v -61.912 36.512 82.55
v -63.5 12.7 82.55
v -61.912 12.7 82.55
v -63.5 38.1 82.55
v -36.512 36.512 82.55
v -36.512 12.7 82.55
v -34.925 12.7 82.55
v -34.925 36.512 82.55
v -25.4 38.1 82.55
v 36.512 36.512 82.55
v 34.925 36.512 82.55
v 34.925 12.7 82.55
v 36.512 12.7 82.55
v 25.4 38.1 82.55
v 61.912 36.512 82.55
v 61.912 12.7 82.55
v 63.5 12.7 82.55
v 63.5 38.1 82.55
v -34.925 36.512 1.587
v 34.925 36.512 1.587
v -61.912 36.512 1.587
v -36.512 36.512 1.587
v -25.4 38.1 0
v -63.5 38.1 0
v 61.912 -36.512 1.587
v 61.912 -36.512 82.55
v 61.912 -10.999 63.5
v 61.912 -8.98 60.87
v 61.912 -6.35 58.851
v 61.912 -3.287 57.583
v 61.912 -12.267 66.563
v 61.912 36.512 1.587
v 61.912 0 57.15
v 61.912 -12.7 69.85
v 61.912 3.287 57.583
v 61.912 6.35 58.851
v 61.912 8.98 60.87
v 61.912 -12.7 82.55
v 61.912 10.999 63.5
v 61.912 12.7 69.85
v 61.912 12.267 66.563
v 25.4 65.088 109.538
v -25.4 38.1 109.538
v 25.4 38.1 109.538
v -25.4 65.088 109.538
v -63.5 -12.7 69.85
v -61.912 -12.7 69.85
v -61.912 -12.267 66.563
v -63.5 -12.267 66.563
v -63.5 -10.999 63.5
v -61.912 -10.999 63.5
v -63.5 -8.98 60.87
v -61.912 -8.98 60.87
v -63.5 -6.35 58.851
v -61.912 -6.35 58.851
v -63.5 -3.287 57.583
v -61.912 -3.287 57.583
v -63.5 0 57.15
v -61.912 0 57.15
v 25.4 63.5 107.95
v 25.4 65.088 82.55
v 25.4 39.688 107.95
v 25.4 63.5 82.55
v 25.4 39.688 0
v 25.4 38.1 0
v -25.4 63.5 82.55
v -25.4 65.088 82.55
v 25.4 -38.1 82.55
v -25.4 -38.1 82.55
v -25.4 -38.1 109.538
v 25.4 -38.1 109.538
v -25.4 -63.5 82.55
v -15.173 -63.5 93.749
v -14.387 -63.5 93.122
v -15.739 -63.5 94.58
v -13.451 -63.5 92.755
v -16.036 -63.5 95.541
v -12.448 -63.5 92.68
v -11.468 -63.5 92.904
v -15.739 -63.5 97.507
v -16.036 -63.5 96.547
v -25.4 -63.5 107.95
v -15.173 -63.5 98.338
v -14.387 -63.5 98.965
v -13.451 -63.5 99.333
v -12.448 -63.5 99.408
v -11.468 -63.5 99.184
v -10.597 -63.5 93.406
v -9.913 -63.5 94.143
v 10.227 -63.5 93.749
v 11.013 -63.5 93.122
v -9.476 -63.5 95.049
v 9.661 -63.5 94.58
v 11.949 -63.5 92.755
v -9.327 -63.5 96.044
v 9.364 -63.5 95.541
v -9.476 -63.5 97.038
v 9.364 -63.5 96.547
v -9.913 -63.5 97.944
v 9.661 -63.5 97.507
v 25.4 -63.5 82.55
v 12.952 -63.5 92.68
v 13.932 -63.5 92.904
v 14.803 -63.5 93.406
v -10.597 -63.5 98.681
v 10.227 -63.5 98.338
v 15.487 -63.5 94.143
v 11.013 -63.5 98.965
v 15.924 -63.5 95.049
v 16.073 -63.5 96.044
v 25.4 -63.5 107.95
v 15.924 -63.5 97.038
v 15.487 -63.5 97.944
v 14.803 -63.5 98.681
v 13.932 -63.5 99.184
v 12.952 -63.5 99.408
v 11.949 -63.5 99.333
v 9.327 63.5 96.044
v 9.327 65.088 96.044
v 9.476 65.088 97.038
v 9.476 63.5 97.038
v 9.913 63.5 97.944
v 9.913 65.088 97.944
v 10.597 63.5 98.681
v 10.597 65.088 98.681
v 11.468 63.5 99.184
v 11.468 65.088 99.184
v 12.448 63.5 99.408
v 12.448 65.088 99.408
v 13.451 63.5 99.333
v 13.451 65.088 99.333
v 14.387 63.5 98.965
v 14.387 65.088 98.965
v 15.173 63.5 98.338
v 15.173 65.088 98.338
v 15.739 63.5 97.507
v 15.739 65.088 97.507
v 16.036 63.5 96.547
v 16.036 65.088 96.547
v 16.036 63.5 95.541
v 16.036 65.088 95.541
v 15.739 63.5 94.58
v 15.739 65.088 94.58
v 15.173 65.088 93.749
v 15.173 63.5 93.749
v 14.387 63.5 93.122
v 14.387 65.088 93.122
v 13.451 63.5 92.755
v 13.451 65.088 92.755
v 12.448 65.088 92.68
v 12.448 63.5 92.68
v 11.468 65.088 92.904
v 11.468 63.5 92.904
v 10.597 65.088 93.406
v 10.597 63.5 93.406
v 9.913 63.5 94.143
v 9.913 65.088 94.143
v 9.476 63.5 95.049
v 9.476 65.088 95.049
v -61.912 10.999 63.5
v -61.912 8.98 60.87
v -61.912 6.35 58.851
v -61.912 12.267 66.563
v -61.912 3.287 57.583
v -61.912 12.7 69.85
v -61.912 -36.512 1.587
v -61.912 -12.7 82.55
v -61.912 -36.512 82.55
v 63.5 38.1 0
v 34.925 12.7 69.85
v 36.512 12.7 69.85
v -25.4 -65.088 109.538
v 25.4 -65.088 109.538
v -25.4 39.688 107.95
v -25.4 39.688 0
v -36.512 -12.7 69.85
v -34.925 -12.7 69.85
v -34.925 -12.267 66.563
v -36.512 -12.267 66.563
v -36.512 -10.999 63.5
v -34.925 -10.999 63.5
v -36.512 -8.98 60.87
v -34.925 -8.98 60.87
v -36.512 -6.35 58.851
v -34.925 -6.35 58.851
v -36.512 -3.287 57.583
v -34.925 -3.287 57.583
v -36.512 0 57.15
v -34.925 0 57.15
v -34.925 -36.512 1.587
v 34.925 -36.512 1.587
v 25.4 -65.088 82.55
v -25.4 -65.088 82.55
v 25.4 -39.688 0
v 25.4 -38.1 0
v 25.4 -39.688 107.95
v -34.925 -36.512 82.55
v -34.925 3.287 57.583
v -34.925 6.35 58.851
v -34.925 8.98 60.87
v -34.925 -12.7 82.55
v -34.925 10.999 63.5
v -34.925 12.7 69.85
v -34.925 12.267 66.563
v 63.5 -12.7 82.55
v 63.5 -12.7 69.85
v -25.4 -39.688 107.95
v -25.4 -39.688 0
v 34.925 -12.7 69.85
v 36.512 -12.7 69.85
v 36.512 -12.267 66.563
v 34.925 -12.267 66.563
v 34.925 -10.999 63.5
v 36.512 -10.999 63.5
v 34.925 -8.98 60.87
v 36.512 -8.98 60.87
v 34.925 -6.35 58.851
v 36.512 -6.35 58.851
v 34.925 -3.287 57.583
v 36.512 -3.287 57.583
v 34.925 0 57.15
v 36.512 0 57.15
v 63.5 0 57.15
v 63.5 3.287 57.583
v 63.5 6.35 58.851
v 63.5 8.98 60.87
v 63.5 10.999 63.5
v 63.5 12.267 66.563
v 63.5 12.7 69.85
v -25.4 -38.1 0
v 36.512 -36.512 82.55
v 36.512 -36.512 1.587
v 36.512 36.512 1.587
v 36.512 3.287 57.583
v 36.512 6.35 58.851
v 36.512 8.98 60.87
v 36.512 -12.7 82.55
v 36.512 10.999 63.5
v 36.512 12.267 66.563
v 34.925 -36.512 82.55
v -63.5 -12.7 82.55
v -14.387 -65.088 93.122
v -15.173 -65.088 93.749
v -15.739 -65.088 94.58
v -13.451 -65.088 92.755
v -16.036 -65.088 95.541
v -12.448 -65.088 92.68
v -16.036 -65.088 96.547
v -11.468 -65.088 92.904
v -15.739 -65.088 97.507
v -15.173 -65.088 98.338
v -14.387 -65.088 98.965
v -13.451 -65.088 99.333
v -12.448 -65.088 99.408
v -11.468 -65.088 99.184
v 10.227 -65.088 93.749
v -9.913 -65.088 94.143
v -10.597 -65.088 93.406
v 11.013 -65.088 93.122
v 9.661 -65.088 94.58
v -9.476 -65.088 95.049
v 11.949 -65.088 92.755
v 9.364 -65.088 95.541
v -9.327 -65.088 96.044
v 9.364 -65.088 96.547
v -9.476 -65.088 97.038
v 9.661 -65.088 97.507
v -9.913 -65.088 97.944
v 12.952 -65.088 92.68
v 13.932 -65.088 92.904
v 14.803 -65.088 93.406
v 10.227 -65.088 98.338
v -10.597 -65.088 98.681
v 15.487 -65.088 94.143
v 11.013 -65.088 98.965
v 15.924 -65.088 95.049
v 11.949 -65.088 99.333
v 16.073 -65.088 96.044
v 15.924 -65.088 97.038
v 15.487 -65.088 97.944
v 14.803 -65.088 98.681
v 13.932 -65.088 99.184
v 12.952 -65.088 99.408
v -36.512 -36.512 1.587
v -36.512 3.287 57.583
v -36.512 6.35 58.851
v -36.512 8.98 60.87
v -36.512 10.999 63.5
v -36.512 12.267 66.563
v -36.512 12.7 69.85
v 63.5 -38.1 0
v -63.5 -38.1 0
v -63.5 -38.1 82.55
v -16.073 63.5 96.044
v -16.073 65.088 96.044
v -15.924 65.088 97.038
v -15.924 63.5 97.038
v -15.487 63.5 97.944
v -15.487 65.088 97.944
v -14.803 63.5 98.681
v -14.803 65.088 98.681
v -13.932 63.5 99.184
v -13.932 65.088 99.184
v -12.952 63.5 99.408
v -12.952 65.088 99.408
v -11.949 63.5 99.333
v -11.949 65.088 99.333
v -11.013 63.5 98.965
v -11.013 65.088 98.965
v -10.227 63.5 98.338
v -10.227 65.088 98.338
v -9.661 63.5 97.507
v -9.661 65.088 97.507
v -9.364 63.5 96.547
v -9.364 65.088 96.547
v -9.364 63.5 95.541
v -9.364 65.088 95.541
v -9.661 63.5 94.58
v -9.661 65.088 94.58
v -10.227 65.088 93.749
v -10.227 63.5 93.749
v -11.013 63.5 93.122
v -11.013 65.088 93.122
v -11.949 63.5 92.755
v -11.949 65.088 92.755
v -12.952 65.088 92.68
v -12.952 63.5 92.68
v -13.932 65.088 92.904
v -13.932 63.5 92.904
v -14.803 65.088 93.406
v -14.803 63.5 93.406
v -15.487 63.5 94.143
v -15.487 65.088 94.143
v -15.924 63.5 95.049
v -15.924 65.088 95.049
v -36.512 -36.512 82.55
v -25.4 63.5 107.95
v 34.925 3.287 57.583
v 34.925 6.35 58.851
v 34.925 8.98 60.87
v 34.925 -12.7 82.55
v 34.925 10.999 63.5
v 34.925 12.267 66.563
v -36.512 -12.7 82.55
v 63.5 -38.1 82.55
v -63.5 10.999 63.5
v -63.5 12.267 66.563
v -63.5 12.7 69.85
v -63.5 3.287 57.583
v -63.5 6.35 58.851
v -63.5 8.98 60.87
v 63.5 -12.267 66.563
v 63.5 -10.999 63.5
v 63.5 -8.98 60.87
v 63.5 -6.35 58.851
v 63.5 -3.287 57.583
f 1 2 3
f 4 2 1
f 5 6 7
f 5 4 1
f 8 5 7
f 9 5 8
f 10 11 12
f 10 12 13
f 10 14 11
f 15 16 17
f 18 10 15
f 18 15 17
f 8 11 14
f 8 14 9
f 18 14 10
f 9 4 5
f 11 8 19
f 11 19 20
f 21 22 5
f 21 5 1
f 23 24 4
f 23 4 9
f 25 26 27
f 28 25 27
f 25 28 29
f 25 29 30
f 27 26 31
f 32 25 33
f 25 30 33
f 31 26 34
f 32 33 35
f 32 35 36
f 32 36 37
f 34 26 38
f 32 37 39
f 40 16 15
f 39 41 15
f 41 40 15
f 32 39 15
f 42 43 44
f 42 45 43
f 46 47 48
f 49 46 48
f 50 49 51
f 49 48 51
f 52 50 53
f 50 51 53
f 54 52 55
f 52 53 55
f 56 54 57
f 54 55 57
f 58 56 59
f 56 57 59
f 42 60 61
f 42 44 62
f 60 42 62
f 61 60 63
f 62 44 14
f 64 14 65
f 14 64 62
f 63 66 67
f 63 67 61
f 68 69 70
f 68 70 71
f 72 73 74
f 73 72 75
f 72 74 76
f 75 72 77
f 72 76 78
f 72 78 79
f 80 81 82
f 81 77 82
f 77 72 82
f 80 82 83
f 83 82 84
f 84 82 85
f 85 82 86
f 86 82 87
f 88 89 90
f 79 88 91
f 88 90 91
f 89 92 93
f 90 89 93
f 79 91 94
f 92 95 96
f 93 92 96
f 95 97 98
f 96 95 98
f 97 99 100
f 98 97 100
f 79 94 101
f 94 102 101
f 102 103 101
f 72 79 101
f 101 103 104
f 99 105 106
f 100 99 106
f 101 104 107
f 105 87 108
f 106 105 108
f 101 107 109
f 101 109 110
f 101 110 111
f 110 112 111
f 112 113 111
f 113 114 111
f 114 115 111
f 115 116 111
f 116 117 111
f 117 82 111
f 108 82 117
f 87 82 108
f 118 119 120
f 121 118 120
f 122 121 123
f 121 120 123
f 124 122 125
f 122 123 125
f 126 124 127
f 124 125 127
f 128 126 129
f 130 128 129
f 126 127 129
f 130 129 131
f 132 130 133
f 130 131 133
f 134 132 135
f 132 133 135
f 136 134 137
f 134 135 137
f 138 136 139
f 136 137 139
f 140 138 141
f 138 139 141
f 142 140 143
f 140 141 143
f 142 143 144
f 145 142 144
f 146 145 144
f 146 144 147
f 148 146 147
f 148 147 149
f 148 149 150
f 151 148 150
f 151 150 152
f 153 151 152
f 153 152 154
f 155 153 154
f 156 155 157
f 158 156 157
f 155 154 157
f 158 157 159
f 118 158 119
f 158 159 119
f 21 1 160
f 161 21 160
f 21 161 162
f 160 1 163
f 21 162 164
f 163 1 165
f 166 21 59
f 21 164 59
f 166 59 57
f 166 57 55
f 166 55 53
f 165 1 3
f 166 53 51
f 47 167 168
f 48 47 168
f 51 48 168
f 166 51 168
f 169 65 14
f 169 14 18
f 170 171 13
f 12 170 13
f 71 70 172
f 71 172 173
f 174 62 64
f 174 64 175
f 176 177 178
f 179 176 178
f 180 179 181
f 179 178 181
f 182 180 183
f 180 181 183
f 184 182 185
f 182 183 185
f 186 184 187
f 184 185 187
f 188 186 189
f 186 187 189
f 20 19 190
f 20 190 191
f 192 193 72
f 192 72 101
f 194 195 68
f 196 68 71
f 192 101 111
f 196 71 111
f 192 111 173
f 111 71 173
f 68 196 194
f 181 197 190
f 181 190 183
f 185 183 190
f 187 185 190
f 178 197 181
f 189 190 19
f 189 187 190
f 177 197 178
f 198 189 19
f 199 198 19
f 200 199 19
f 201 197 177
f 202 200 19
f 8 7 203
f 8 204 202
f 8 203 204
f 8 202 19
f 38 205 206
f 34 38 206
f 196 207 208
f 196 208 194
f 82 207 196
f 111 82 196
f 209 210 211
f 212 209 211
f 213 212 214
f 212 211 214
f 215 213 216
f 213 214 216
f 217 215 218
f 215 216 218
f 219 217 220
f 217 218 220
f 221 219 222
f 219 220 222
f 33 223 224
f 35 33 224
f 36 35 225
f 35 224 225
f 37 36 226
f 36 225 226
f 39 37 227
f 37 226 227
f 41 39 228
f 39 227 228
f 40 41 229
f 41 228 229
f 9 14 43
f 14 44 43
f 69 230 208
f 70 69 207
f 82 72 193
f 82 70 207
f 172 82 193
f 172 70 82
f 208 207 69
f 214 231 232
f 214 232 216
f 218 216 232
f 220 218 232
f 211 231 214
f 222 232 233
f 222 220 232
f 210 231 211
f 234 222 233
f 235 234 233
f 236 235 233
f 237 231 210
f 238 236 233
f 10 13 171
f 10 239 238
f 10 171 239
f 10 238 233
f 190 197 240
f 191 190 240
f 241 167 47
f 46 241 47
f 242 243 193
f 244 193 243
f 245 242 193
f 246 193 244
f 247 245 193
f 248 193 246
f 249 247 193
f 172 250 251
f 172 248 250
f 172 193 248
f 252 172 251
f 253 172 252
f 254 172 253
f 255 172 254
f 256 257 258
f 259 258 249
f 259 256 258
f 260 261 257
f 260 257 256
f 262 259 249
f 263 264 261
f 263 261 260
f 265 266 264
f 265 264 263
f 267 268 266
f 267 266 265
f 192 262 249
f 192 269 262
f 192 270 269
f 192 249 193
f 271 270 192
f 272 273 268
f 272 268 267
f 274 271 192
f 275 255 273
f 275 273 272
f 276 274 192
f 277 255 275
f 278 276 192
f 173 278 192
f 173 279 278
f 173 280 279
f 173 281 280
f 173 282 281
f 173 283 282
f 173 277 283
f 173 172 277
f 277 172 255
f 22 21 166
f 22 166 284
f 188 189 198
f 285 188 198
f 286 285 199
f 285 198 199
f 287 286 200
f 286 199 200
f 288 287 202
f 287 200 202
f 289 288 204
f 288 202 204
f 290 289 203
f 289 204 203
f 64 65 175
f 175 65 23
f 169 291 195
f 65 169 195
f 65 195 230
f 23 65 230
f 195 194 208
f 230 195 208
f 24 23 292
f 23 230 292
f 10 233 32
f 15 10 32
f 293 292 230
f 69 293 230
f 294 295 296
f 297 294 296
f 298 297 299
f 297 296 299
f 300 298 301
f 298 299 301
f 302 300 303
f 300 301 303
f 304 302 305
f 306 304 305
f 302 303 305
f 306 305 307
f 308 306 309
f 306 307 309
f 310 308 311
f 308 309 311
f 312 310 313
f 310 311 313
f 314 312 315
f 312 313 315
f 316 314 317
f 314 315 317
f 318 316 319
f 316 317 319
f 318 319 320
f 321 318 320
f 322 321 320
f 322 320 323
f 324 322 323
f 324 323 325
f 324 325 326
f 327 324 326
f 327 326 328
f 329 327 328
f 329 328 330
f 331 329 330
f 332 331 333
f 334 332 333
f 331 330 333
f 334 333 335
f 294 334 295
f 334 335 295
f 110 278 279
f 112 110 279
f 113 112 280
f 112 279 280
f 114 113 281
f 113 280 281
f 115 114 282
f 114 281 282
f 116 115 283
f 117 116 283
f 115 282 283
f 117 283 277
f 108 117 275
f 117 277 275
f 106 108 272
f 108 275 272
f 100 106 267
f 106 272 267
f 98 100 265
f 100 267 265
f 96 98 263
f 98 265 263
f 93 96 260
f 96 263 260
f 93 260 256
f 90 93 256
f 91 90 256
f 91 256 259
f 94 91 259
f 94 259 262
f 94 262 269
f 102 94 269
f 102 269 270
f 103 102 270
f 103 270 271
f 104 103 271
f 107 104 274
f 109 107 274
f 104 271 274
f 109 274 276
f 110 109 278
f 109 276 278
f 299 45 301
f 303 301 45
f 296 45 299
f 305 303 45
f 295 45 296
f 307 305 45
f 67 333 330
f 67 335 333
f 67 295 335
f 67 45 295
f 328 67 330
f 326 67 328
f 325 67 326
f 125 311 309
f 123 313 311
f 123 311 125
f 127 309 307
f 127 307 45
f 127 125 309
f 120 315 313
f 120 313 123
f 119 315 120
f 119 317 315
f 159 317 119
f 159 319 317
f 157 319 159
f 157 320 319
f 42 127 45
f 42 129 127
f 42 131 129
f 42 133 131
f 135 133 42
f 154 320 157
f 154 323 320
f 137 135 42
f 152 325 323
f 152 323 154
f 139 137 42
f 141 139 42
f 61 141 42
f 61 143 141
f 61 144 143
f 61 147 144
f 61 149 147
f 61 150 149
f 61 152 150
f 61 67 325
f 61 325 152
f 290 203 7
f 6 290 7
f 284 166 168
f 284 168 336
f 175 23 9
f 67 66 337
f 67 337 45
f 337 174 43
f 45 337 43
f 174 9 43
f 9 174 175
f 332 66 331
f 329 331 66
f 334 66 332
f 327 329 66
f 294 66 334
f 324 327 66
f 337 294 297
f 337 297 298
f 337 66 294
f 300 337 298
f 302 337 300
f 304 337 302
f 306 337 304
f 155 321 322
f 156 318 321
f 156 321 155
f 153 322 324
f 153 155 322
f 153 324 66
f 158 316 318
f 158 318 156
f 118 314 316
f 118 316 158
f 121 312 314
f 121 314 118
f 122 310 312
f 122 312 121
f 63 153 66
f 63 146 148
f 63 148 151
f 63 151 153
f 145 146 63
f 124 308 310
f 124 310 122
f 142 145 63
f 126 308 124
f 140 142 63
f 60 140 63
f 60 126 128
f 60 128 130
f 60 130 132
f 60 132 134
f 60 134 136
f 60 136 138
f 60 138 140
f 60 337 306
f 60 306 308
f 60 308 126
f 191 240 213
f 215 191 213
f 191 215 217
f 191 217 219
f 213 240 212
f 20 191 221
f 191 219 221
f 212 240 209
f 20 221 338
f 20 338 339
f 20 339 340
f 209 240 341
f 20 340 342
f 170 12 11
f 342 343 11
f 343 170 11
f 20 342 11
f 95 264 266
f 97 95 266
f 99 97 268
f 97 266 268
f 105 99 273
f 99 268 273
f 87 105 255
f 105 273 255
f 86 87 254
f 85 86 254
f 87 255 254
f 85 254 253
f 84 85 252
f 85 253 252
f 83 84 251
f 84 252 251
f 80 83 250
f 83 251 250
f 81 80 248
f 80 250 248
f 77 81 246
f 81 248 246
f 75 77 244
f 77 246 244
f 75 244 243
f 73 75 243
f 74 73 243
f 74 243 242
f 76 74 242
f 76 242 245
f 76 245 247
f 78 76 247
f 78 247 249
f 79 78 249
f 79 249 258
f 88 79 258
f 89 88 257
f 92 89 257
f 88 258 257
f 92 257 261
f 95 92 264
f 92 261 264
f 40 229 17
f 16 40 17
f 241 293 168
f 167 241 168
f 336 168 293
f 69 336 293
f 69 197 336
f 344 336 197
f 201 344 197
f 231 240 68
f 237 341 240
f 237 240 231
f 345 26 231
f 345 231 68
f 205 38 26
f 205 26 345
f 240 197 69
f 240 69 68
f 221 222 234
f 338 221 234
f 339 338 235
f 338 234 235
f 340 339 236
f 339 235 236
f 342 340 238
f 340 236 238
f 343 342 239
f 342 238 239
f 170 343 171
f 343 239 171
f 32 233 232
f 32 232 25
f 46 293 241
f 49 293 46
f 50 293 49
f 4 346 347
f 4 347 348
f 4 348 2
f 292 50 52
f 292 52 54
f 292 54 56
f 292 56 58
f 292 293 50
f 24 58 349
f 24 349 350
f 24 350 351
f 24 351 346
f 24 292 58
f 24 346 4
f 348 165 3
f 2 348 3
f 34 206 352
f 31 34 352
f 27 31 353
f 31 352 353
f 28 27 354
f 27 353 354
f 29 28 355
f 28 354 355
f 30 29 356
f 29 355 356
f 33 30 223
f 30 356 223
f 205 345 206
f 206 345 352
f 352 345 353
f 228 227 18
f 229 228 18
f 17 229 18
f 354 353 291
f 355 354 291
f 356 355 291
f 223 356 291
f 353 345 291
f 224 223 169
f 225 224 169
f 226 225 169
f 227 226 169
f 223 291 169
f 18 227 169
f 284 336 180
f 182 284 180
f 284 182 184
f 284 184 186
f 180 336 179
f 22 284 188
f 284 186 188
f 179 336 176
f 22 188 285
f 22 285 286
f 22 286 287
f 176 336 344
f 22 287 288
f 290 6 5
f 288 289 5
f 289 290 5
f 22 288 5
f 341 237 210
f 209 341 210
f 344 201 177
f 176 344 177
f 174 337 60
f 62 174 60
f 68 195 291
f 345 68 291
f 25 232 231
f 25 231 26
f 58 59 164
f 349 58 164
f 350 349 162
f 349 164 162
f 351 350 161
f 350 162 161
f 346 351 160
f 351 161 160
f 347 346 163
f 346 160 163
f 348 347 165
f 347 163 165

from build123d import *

# Parameters (mm, degrees)
F0_W      = 127
F0_H      = 76.2
F1_DEPTH  = 82.55
F3_W      = 25.4
F3_H      = 73.025
F3_W_2    = 69.85
F4_DEPTH  = 80.9625
F6_DEPTH  = 127.001
F8_DEPTH  = 1.5875
F10_DEPTH = 1.5875
F11_W     = 50.8
F11_H     = 26.9875
F11_H_2   = 1.5875
F11_H_3   = 25.4
F12_DEPTH = 1.5875
F13_W     = 50.8
F13_H     = 1.5875
F14_DEPTH = 25.4
F15_R     = 3.3734375
F16_DEPTH = 1.5875
F17_R     = 3.3734375
F18_DEPTH = 1.5875


# Not quite as in the source:
# - a length typed as a fraction of an inch, garbled in the dataset ("3 / 203.2 mm" for 3/8 in), is restored


with BuildPart() as f1:
    # F0 (on Top) → F1 (new body)
    with BuildSketch(Plane.XY):
        Rectangle(F0_W, F0_H)
    extrude(amount=F1_DEPTH)

    # F3 (on face) → F4 (cut)
    with BuildSketch(Plane.XY.offset(82.55)):
        Polygon((-61.9125, 36.5125), (-61.9125, 0), (-61.9125, -36.5125), (-36.5125, -36.5125), (-36.5125, 36.5125), align=None)
        with Locations((49.2125, 0)):
            Rectangle(F3_W, F3_H)
        Rectangle(F3_W_2, F3_H)
    extrude(amount=-F4_DEPTH, mode=Mode.SUBTRACT)

    # F5 (on face) → F6 (cut, through all)
    with BuildSketch(Plane.YZ.offset(63.5)):
        with BuildLine():
            Line((12.7, 69.85), (12.7, 82.55))
            Line((12.7, 82.55), (0, 82.55))
            Line((0, 82.55), (-12.7, 82.55))
            Line((-12.7, 82.55), (-12.7, 69.85))
            ThreePointArc((-12.7, 69.85), (-8.9802561211, 60.8697438789), (0, 57.15))
            ThreePointArc((0, 57.15), (8.9802561211, 60.8697438789), (12.7, 69.85))
        make_face()
    extrude(amount=-F6_DEPTH, mode=Mode.SUBTRACT)

    # F7 (on face) → F8 (join)
    with BuildSketch(Plane.XZ.offset(38.1)):
        Polygon((-12.7, 0), (0, 0), (12.7, 0), (25.4, 0), (25.4, 107.95), (12.7, 107.95), (-12.7, 107.95), (-25.4, 107.95), (-25.4, 0), align=None)
    extrude(amount=F8_DEPTH)

    # F9 (on face) → F10 (join)
    with BuildSketch(Plane(origin=(0, 38.1, 0), x_dir=(-1, 0, 0), z_dir=(0, 1, 0))):
        Polygon((-12.7, 0), (0, 0), (12.7, 0), (25.4, 0), (25.4, 82.55), (-25.4, 82.55), (-25.4, 0), align=None)
        Polygon((-25.4, 82.55), (25.4, 82.55), (25.4, 107.95), (12.7, 107.95), (-12.7, 107.95), (-25.4, 107.95), align=None)
    extrude(amount=F10_DEPTH)

    # F11 (on face) → F12 (join)
    with BuildSketch(Plane.XY.offset(107.95)):
        with Locations((0, -51.59375)):
            Rectangle(F11_W, F11_H)
        with Locations((0, 38.89375)):
            Rectangle(F11_W, F11_H_2)
        with Locations((0, 52.3875)):
            Rectangle(F11_W, F11_H_3)
    extrude(amount=F12_DEPTH)

    # F13 (on face) → F14 (join)
    with BuildSketch(Plane(origin=(0, 0, 107.95), x_dir=(1, 0, 0), z_dir=(0, 0, -1))):
        with Locations((0, 64.29375)):
            Rectangle(F13_W, F13_H)
        with Locations((0, -64.29375)):
            Rectangle(F13_W, F13_H)
    extrude(amount=F14_DEPTH)

    # F15 (on face) → F16 (cut)
    with BuildSketch(Plane.XZ.offset(65.0875)):
        with Locations((12.7, 96.04375)):
            Circle(F15_R)
        with Locations((-12.7, 96.04375)):
            Circle(F15_R)
    extrude(amount=-F16_DEPTH, mode=Mode.SUBTRACT)

    # F17 (on face) → F18 (cut)
    with BuildSketch(Plane(origin=(0, 65.0875, 0), x_dir=(-1, 0, 0), z_dir=(0, 1, 0))):
        with Locations((12.7, 96.04375)):
            Circle(F17_R)
        with Locations((-12.7, 96.04375)):
            Circle(F17_R)
    extrude(amount=-F18_DEPTH, mode=Mode.SUBTRACT)


solid = f1.part
